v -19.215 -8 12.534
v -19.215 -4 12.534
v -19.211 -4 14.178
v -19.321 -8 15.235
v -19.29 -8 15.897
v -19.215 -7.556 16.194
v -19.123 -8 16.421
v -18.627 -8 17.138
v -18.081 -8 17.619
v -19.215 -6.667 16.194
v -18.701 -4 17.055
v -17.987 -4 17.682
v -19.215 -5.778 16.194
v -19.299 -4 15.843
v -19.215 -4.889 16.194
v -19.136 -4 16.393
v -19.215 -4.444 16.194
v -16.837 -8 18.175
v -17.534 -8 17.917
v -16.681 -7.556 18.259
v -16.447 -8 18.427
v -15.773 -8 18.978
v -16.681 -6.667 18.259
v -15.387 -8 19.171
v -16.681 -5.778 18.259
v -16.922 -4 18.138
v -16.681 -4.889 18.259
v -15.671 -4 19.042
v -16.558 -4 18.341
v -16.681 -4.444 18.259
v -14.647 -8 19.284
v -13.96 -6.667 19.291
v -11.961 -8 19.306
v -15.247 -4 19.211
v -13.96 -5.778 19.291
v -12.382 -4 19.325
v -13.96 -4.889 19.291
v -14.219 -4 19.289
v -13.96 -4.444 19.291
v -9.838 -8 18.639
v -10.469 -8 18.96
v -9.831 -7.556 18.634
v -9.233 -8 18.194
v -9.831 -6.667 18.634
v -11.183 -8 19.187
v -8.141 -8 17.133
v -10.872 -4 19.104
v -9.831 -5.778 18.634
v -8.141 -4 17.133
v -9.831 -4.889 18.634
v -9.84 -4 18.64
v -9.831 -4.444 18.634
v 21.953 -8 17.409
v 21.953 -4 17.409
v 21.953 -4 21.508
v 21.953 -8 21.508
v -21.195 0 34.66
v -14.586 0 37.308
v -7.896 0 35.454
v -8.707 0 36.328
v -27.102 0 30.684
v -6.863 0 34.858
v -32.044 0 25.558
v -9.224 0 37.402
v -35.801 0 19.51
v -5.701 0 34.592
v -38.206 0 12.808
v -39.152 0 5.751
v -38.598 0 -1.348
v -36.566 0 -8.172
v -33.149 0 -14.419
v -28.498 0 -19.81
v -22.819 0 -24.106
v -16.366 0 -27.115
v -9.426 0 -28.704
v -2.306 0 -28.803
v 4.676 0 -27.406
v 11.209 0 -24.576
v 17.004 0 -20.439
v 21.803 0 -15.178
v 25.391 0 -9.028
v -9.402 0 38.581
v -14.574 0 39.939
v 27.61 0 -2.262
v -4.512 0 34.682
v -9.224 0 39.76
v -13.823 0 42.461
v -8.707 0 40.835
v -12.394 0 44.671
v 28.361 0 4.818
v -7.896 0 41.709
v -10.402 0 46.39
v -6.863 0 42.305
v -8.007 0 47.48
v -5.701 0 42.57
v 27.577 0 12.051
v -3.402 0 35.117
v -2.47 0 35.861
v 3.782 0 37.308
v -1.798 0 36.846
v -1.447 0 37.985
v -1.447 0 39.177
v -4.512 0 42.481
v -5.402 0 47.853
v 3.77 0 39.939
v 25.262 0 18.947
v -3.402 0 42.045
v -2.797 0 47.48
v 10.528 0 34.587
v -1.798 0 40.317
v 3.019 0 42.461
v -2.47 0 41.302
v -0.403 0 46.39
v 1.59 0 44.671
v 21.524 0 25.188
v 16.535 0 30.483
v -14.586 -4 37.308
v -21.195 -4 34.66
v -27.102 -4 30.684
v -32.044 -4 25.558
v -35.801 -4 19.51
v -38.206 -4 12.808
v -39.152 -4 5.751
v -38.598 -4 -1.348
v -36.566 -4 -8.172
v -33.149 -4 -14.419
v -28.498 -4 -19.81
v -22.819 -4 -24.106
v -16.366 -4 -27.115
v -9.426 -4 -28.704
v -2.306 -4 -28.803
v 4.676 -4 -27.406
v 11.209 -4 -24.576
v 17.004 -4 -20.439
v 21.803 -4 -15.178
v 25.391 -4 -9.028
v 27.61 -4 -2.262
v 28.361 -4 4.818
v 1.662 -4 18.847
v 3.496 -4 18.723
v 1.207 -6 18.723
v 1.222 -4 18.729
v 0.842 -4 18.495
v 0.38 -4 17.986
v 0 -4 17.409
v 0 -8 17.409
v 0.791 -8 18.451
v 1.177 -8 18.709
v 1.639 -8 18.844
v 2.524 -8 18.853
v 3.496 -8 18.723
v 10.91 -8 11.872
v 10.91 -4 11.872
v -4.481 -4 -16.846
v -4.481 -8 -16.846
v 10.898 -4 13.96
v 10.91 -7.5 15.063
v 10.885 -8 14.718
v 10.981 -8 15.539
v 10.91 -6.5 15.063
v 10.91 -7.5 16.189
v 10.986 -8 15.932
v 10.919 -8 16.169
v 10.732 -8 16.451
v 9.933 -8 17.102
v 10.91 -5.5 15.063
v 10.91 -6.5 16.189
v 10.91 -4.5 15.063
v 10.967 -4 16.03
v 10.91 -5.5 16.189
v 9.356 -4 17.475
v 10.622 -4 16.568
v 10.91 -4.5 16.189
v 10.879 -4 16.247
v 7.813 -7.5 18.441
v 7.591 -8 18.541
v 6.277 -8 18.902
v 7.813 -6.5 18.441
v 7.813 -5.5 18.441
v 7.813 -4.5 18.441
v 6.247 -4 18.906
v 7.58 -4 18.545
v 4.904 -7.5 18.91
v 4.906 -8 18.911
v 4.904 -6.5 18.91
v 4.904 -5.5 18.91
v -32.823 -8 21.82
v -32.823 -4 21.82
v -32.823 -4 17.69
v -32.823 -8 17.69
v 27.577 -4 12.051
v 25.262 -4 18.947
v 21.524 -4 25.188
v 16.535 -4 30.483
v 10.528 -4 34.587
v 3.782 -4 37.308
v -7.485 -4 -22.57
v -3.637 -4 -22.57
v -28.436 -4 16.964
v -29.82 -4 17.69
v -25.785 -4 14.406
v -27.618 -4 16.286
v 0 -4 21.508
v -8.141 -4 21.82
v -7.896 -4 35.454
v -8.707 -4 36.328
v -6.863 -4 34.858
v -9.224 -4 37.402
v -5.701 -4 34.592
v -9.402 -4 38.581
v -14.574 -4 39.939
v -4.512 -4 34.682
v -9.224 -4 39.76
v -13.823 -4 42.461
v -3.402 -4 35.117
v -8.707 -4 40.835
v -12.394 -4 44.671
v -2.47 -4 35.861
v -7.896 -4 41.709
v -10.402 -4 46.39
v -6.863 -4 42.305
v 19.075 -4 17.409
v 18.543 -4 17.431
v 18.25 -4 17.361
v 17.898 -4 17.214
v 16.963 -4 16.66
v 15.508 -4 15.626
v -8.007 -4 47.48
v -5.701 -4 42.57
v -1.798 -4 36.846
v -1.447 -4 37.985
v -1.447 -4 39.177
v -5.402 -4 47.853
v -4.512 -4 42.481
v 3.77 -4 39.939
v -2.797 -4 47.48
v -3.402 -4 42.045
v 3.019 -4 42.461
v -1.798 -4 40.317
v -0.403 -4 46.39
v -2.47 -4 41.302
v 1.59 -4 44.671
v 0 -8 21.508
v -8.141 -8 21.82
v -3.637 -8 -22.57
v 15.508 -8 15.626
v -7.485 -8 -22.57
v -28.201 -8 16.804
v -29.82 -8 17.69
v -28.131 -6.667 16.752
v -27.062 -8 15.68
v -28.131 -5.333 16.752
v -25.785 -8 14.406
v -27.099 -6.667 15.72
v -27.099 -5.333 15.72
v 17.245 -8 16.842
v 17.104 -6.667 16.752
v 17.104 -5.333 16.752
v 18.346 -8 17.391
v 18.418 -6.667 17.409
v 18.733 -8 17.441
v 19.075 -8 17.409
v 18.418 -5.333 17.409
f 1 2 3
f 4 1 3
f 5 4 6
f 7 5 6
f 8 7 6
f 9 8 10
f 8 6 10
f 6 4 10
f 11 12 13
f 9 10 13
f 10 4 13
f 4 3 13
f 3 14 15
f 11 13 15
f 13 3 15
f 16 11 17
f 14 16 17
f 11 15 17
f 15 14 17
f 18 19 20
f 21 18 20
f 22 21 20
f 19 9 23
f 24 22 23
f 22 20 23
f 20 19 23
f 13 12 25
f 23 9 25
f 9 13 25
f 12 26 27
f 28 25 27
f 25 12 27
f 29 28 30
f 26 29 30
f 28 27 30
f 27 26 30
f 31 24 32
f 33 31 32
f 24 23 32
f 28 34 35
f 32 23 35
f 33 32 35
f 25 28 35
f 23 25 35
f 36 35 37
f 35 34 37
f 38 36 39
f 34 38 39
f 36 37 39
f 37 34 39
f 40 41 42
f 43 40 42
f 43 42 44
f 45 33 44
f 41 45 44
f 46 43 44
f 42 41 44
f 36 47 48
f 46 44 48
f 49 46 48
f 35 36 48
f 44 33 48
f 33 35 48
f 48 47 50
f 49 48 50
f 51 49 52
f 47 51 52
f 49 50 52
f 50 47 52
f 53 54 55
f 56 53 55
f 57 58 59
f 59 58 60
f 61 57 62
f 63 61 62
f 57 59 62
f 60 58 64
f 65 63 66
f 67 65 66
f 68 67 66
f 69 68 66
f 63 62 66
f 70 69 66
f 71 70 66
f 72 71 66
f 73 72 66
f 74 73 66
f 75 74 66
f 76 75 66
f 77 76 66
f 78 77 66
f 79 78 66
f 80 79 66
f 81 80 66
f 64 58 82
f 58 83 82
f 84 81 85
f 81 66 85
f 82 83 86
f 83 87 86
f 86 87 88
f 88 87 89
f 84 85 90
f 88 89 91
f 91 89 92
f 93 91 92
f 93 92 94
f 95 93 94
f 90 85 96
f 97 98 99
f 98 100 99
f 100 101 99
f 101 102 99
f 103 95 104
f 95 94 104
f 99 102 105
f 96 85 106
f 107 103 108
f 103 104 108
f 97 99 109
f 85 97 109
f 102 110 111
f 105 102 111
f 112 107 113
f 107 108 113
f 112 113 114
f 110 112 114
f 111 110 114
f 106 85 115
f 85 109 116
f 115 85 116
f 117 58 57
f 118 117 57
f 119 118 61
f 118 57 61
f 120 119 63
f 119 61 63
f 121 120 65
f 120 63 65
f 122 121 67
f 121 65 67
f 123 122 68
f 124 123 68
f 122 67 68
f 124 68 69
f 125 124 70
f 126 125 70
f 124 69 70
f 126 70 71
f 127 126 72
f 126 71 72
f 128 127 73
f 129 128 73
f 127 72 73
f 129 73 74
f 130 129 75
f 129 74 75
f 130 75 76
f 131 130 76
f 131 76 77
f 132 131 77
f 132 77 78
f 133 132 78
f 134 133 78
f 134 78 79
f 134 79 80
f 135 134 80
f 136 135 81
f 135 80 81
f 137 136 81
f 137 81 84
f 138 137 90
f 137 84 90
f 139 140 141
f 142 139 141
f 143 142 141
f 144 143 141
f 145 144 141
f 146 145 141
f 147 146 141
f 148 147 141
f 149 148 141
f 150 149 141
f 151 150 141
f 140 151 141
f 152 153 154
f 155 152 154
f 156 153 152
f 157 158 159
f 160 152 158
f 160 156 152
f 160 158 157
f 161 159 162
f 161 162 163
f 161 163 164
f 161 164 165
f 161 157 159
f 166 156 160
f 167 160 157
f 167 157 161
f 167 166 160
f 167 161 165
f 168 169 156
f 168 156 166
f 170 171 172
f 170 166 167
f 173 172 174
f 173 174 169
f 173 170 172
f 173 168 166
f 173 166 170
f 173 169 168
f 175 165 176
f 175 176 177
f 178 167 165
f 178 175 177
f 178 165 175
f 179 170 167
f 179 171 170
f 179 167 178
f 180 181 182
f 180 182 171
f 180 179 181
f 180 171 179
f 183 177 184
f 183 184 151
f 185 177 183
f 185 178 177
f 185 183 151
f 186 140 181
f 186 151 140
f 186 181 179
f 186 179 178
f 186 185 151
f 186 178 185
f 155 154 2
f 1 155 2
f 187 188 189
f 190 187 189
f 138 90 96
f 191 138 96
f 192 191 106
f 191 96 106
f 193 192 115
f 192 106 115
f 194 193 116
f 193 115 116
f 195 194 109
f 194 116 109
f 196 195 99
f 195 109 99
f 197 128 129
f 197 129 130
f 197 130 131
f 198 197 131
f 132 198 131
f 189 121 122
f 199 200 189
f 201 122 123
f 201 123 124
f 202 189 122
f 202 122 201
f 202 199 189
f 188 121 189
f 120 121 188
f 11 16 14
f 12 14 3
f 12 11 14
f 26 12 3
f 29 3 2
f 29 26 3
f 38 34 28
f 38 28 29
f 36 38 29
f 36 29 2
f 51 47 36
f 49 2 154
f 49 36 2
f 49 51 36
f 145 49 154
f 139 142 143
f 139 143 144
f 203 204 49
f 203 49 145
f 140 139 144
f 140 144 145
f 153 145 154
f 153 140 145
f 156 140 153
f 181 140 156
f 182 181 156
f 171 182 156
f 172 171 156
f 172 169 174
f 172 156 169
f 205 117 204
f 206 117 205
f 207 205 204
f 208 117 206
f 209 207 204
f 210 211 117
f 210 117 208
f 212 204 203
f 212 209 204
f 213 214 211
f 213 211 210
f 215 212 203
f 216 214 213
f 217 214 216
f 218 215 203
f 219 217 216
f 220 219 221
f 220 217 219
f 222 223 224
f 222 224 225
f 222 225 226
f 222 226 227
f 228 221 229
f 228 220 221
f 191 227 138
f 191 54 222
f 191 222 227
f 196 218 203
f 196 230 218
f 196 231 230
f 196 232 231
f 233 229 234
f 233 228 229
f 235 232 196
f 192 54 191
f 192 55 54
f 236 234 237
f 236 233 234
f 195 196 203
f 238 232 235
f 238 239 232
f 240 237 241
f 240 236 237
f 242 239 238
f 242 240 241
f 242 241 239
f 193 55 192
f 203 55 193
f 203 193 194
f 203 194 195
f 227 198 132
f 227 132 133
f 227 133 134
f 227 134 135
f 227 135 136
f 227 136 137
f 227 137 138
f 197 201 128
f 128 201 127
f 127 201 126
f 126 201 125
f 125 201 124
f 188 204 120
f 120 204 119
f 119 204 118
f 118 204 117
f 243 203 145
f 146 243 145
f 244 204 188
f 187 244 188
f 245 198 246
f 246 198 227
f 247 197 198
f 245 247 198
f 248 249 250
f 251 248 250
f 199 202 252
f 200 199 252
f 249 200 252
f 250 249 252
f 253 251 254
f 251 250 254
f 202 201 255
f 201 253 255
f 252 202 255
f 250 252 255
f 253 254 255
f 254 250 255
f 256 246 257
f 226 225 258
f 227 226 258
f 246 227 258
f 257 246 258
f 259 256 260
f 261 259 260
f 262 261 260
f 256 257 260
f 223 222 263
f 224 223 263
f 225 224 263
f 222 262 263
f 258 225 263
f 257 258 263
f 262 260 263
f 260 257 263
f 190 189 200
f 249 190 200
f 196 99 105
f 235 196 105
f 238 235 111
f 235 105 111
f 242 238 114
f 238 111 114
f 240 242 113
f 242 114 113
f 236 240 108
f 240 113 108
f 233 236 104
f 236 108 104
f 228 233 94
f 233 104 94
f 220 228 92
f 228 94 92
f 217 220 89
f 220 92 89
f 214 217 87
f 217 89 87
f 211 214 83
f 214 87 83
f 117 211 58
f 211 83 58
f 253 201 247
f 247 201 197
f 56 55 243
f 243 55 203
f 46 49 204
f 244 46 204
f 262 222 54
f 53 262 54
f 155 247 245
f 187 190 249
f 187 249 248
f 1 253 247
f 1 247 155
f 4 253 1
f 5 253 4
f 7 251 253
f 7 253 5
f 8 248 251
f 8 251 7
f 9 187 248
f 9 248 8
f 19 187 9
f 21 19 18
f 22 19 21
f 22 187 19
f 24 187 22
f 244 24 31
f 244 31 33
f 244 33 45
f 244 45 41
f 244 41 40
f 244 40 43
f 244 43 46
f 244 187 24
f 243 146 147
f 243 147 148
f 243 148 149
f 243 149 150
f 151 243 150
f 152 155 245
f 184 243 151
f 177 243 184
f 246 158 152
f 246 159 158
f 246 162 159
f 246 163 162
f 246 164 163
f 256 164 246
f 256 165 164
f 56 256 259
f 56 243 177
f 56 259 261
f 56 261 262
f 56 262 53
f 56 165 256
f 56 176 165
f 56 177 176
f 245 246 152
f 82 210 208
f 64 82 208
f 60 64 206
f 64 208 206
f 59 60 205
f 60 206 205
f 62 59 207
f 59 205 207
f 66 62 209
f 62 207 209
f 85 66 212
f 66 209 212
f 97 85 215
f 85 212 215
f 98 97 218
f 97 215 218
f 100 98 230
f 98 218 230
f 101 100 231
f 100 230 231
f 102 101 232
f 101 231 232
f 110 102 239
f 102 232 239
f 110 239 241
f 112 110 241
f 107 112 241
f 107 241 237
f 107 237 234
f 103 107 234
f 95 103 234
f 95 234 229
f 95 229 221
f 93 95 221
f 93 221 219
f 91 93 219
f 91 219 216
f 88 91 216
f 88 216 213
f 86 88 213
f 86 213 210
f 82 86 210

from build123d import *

# Parameters (mm, degrees)
F2_DEPTH = 4
F3_DEPTH = 8
F4_D     = 8


with BuildPart() as f2:
    # F0 (on Front) → F2 (new body)
    with BuildSketch(Plane.XZ):
        with BuildLine():
            ThreePointArc((-14.5860280627, 37.3082353296), (-25.7721388072, -22.1079707805), (28.3610324481, 4.8181205057))
            ThreePointArc((28.3610324481, 4.8181205057), (21.5239565547, 25.1881245814), (3.7817585998, 37.3082353296))
            ThreePointArc((3.7817585998, 37.3082353296), (-5.4021347314, 38.5812876852), (-14.5860280627, 37.3082353296))
        make_face()
        with BuildLine():
            ThreePointArc((-14.5860280627, 37.3082353296), (-5.4021347314, 38.5812876852), (3.7817585998, 37.3082353296))
            ThreePointArc((3.7817585998, 37.3082353296), (-5.4021347314, 47.8529951342), (-14.5860280627, 37.3082353296))
        make_face()
    extrude(amount=F2_DEPTH)

    # F1 (on Front) → F3 (join)
    with BuildSketch(Plane.XZ):
        with BuildLine():
            Line((-4.4812308624, -16.8456733227), (-19.2153304815, 12.5339938145))
            add(Edge.make_bspline(
                [(-19.2153304815, 12.5339938145), (-19.187462489, 13.0831996069), (-19.1294936303, 14.2256153377), (-19.5971693345, 16.2617964648), (-17.8782485083, 17.9666592712), (-16.6275418026, 18.0902554056), (-15.6181704414, 19.3512209953), (-13.9181197744, 19.2424127885), (-11.7824548248, 19.4327511912), (-9.7234432074, 18.78281747), (-8.6760339336, 17.6903028041), (-8.1412922591, 17.1325331371)],
                knots=[0, 0, 0, 0, 0.1071084643, 0.2227988055, 0.3430054249, 0.4340300552, 0.531806279, 0.6362553536, 0.7573294755, 0.8761076058, 1, 1, 1, 1], degree=3))
            Line((-8.1412922591, 17.1325331371), (-8.1412922591, 21.8196045607))
            Line((-8.1412922591, 21.8196045607), (-32.823253423, 21.8196045607))
            Line((-32.823253423, 21.8196045607), (-32.823253423, 17.6903028041))
            Line((-32.823253423, 17.6903028041), (-29.82012555, 17.6903028041))
            add(Edge.make_bspline(
                [(-29.82012555, 17.6903028041), (-29.2063598721, 17.3976096984), (-28.0591181767, 16.8505120895), (-27.1198992634, 15.6946853483), (-26.2472646135, 14.852226462), (-25.7846731693, 14.4056314602)],
                knots=[0, 0, 0, 0, 0.3509068735, 0.6559099195, 1, 1, 1, 1], degree=3))
            Line((-25.7846731693, 14.4056314602), (-7.4853163581, -22.570386529))
            Line((-7.4853163581, -22.570386529), (-3.6366009153, -22.570386529))
            Line((-3.6366009153, -22.570386529), (15.5083434656, 15.6256519258))
            add(Edge.make_bspline(
                [(15.5083434656, 15.6256519258), (16.0368847546, 16.0146436885), (17.0238298067, 16.7410079357), (18.3620600475, 17.5065309977), (18.870715753, 17.4367319386), (19.0745573491, 17.4087602645)],
                knots=[0, 0, 0, 0, 0.4086138264, 0.763004523, 1, 1, 1, 1], degree=3))
            Line((19.0745573491, 17.4087602645), (21.9529736787, 17.4087602645))
            Line((21.9529736787, 17.4087602645), (21.9529736787, 21.5079374611))
            Line((21.9529736787, 21.5079374611), (0, 21.5079374611))
            Line((0, 21.5079374611), (0, 17.4087602645))
            add(Edge.make_bspline(
                [(0, 17.4087602645), (0.3386937554, 17.949393323), (1.0610240671, 19.1023984773), (2.6512466921, 18.8543631276), (3.4958291799, 18.7226291746)],
                knots=[0, 0, 0, 0, 0.4688904091, 1, 1, 1, 1], degree=3))
            add(Edge.make_bspline(
                [(10.9098004177, 11.8717420846), (10.9188597305, 12.4813561639), (10.935968454, 13.6326265761), (10.8225562165, 15.0366139564), (11.2426073131, 16.3445815867), (9.2157140004, 17.5146925888), (7.9119458784, 18.5112803322), (6.2229710967, 18.9887989549), (4.9082762613, 18.9351899547), (3.9727099672, 18.7943955108), (3.4958291799, 18.7226291746)],
                knots=[0, 0, 0, 0, 0.1338160834, 0.2527147957, 0.3590610282, 0.503128831, 0.6364791552, 0.7657092985, 0.880576358, 1, 1, 1, 1], degree=3))
            Line((10.9098004177, 11.8717420846), (-4.4812308624, -16.8456733227))
        make_face()
    extrude(amount=F3_DEPTH)

    # F4 (through all)
    with Locations(Plane(origin=(0, 0, 0), x_dir=(1, 0, 0), z_dir=(0, 1, 0))):
        with Locations((-5.4021347314, -38.5812876852)):
            Hole(F4_D / 2)


solid = f2.part
